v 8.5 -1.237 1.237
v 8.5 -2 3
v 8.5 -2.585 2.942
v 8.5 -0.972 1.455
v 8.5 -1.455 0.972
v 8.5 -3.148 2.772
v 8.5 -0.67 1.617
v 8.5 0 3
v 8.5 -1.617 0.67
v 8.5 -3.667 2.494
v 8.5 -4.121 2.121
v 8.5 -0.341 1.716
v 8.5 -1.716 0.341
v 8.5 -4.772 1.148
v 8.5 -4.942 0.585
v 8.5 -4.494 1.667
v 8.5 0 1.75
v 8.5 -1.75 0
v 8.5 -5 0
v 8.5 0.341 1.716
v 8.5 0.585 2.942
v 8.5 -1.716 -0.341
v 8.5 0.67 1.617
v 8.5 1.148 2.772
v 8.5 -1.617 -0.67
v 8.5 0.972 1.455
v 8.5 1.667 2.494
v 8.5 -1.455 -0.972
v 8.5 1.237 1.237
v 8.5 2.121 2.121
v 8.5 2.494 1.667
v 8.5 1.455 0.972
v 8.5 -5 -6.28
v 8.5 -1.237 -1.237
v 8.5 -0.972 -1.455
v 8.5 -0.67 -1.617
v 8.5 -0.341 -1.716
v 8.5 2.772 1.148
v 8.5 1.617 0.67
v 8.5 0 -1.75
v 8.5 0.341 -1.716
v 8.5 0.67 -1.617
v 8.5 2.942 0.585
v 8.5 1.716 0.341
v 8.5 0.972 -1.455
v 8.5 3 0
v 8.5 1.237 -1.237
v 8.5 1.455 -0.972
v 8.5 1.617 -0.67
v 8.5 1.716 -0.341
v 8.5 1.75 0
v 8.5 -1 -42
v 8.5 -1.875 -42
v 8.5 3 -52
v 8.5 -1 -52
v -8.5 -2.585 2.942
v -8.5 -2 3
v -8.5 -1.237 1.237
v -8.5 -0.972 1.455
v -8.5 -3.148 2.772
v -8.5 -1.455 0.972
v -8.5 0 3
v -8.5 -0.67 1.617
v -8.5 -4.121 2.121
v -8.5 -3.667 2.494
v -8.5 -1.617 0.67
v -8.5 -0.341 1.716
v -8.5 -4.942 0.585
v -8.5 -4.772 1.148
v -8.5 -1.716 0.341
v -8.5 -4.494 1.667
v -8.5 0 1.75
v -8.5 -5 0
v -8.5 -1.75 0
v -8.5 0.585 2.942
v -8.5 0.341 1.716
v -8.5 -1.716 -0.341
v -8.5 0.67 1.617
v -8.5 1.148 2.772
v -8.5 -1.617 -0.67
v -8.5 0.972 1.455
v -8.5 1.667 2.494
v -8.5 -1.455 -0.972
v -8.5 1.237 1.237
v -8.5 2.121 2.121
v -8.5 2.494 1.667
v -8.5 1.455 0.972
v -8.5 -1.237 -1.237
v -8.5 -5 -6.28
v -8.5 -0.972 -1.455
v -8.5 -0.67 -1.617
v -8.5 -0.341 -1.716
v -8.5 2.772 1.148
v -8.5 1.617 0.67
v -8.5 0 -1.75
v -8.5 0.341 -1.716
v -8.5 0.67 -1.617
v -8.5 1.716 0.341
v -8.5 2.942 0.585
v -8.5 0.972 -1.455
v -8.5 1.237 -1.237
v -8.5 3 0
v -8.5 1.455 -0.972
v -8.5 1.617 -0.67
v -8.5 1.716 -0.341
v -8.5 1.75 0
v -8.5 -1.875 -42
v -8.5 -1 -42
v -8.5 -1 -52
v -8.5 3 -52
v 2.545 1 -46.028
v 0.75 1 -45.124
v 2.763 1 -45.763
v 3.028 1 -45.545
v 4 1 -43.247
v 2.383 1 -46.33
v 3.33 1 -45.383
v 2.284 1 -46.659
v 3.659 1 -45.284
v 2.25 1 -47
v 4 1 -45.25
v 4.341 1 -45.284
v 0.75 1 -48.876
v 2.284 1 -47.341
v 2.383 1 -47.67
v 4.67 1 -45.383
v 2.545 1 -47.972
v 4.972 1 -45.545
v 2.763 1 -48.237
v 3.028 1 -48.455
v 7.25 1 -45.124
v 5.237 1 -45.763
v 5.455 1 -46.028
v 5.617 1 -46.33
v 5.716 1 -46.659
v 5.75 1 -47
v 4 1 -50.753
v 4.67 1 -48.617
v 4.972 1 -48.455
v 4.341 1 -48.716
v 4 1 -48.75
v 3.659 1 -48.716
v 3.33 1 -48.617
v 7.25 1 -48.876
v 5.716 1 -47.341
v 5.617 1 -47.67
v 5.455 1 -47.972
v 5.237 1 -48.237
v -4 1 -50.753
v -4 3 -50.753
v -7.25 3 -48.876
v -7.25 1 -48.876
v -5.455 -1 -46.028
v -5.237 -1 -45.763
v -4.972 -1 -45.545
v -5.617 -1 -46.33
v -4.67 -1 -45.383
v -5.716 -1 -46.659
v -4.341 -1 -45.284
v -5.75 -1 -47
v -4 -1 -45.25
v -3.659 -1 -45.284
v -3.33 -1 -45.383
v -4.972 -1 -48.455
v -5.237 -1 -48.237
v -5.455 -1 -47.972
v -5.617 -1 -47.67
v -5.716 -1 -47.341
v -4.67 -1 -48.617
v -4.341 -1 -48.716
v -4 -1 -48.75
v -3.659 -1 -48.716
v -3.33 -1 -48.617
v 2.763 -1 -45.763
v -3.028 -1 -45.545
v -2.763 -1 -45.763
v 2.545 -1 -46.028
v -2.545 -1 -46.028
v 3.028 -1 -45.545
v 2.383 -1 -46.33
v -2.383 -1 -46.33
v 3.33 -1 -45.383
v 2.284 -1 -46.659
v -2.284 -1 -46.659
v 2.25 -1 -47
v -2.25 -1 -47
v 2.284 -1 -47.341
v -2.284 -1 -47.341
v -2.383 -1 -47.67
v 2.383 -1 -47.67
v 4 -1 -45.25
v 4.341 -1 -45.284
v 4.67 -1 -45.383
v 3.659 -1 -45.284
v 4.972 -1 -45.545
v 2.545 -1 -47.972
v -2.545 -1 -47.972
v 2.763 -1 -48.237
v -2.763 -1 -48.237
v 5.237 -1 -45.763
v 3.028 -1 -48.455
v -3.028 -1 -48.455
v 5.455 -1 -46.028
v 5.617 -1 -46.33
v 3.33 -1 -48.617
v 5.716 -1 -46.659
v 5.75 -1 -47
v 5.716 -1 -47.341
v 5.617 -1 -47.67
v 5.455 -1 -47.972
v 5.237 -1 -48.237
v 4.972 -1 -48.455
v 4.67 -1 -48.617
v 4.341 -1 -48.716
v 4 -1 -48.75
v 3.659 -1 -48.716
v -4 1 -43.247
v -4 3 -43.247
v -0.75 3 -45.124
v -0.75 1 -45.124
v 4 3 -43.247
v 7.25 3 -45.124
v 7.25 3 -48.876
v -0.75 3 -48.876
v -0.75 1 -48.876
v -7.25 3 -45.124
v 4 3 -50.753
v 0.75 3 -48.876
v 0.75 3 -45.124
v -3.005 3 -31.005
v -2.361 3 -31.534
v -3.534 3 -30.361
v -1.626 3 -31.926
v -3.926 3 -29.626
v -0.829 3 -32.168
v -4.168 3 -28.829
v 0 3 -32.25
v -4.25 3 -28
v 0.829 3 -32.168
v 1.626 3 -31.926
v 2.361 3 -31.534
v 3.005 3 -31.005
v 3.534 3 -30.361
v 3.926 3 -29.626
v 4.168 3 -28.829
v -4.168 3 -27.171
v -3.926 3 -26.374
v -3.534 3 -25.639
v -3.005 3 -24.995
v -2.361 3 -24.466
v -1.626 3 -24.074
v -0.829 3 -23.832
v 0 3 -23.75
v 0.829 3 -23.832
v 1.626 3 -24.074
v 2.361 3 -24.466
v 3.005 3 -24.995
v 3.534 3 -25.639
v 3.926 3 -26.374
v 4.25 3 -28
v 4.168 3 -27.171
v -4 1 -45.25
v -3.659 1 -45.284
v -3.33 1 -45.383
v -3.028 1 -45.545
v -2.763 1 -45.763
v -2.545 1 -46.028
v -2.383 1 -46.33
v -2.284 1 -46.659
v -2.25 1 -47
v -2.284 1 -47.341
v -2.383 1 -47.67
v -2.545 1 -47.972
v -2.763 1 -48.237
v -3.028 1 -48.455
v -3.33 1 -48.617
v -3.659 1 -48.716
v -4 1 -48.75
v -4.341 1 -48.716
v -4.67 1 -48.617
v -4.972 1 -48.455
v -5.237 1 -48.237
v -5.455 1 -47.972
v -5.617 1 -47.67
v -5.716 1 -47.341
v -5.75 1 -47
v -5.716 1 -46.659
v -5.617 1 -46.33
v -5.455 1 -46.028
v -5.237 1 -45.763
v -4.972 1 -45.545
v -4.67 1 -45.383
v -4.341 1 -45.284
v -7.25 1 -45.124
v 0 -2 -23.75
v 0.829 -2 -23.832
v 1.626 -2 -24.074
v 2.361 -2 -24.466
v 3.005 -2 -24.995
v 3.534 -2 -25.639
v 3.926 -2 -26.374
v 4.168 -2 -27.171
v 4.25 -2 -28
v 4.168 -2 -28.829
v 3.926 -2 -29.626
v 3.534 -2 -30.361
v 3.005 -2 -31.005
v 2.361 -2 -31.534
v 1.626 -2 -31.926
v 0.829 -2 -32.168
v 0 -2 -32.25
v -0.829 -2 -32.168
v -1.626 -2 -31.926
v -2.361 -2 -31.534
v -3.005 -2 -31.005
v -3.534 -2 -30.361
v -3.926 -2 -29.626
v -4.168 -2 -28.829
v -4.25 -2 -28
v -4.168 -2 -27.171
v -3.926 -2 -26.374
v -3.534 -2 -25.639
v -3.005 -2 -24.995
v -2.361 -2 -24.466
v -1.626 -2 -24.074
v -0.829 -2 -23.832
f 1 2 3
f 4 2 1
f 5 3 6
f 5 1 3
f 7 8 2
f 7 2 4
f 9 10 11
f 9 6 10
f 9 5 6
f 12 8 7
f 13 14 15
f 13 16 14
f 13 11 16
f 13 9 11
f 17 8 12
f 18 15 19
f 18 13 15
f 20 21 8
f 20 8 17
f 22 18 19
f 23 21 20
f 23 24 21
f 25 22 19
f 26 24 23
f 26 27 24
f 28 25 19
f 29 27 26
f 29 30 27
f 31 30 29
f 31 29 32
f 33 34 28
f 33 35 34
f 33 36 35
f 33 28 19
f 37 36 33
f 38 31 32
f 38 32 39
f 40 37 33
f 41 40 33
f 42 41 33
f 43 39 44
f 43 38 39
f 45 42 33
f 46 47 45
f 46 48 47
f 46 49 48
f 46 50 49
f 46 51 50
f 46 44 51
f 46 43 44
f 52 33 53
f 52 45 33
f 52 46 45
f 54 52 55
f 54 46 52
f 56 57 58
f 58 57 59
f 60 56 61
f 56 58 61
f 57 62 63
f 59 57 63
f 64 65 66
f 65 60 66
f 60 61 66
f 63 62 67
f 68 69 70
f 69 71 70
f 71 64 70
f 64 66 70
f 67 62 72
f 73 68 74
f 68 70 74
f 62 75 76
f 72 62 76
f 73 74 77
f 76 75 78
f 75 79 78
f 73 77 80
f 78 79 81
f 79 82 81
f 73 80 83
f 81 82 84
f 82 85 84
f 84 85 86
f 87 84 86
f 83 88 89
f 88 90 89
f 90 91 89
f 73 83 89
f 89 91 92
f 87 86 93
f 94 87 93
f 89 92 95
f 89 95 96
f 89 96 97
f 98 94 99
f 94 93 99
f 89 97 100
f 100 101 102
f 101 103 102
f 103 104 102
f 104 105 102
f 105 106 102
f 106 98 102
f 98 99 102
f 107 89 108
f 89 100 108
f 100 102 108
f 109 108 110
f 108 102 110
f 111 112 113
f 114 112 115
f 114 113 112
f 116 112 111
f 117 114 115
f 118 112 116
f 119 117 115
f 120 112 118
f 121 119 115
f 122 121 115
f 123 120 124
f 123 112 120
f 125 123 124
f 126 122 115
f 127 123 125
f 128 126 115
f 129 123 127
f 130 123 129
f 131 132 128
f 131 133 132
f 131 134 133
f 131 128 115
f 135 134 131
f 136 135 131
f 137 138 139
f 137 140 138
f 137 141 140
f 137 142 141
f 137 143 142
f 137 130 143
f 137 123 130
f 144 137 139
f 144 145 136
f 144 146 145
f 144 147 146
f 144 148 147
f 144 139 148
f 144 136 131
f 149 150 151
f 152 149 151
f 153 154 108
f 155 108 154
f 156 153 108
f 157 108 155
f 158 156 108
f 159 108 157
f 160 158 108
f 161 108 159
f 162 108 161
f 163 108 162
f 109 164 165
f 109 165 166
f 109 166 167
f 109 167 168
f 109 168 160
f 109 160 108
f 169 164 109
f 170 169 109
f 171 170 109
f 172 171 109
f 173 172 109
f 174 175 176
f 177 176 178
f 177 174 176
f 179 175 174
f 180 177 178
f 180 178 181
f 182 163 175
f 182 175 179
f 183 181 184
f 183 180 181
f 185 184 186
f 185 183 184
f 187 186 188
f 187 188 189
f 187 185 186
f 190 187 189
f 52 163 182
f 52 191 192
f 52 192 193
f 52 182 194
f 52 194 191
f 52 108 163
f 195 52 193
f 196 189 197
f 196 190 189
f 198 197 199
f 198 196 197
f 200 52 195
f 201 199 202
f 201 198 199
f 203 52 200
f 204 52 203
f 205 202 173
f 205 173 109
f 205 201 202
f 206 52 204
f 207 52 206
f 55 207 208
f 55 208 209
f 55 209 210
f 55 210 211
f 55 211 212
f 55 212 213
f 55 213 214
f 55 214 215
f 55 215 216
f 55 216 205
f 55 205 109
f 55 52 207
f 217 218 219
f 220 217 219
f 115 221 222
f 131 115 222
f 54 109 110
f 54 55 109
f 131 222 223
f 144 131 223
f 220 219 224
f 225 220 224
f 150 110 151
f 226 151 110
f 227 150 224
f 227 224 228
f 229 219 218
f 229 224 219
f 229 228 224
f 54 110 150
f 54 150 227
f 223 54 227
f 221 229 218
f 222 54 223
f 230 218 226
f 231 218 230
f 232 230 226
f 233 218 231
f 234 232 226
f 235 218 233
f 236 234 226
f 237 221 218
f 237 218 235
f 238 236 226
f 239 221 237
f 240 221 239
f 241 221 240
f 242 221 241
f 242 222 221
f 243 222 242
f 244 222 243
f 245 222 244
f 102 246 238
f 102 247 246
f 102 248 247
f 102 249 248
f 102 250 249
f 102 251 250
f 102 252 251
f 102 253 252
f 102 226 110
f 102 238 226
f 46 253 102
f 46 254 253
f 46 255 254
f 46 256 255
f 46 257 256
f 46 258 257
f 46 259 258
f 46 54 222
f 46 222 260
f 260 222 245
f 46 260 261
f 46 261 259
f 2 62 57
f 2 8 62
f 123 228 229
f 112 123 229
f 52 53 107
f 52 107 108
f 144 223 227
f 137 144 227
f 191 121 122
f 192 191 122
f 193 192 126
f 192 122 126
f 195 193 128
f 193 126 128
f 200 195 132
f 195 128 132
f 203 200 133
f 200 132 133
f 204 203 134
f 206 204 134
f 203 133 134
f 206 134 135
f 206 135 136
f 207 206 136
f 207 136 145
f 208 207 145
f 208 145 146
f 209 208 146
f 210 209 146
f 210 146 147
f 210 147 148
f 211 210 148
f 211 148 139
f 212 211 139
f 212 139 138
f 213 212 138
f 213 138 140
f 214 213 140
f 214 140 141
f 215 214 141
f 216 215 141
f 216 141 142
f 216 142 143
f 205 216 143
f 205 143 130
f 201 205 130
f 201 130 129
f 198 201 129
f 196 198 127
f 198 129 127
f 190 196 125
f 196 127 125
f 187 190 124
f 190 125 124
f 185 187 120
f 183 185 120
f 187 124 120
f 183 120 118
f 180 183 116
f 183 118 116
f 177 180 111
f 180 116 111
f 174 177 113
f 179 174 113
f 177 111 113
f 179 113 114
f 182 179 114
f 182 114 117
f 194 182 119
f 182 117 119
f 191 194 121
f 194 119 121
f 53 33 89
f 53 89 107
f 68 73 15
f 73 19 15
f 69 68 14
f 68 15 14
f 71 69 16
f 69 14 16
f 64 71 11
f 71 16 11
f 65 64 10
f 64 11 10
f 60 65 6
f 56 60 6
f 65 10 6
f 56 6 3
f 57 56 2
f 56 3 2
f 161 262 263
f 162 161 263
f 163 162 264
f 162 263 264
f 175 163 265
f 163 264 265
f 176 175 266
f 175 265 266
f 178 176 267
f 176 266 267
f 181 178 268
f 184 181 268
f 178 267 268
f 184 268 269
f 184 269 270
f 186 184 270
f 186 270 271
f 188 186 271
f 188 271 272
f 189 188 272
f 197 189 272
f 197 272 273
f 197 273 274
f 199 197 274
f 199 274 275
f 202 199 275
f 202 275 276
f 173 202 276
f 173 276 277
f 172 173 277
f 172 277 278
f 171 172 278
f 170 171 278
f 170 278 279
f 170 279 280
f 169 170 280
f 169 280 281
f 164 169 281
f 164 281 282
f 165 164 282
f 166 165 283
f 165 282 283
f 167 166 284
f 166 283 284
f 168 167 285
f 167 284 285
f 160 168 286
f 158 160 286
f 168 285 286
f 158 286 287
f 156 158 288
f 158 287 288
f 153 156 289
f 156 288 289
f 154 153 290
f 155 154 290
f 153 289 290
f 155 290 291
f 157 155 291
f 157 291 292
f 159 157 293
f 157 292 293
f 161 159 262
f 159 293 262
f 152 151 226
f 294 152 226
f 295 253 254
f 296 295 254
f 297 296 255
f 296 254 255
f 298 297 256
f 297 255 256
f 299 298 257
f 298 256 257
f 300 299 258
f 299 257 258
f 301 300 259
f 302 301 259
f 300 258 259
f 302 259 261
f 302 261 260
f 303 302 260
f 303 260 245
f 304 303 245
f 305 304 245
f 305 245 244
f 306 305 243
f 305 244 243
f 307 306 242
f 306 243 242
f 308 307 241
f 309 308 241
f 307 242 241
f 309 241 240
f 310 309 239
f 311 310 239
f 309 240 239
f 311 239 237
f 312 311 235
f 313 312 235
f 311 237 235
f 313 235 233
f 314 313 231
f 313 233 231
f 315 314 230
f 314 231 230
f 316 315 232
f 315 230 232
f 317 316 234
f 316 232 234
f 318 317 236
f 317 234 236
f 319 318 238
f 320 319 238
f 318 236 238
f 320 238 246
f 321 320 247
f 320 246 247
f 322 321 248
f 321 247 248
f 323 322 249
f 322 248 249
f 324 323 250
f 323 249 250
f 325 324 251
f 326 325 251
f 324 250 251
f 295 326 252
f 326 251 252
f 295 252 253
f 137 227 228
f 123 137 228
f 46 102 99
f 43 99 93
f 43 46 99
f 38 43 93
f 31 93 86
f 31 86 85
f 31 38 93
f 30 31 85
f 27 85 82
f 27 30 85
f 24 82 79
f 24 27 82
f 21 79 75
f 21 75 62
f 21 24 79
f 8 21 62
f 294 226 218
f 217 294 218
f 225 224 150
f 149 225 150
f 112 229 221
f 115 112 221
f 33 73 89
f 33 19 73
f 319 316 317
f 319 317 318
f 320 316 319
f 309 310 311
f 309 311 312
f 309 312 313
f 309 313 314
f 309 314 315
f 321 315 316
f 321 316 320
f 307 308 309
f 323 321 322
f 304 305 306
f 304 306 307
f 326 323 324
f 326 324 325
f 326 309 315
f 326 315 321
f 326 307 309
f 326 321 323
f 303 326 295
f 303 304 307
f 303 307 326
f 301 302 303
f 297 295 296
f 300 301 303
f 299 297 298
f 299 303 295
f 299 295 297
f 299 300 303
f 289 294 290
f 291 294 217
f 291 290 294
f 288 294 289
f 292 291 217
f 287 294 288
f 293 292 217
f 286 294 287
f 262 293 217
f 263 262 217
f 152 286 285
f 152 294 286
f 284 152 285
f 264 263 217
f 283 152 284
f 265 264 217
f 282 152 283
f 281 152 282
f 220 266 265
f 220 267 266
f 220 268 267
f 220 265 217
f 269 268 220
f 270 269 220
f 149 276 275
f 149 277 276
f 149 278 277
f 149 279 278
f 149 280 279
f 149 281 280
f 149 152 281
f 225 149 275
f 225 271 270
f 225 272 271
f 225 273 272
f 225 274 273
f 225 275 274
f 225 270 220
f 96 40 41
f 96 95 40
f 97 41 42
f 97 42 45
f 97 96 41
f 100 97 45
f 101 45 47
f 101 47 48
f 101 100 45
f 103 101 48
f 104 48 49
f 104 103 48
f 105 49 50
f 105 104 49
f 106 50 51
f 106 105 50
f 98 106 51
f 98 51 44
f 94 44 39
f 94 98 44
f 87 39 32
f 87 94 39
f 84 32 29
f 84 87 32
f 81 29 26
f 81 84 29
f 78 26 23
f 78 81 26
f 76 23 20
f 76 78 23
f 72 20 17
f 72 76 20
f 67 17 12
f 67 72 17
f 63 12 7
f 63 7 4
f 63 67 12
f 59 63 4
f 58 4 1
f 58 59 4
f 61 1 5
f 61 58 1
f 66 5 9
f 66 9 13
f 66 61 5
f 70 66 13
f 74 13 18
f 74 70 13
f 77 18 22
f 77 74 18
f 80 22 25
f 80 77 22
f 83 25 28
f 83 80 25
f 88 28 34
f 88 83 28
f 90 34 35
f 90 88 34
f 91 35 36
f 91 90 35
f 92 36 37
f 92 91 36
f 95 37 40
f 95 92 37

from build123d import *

# Parameters (mm, degrees)
SKETCH1_R           = 1.75
BOSS_EXTRUDE1_DEPTH = 8.5
FILLET1_R           = 3
SKETCH2_R           = 1.75
CUT_EXTRUDE1_DEPTH  = 54.293995909
SKETCH2_3_R         = 1.75
CUT_EXTRUDE2_DEPTH  = 2
SKETCH3_R           = 4.25
CUT_EXTRUDE3_DEPTH  = 5


with BuildPart() as part:
    # Sketch1 → Boss-Extrude1 (new, symmetric)
    with BuildSketch(Plane(origin=(0, 0, 0), x_dir=(0, 0, -1), z_dir=(1, 0, 0))):
        with BuildLine():
            ThreePointArc((0, 3), (-2.121320344, 2.121320344), (-3, 0))
            Line((-3, 0), (-3, -5))
            Line((-3, -5), (6.279790789, -5))
            Line((6.279790789, -5), (42, -1.874886635))
            Line((42, -1.874886635), (42, -1))
            Line((42, -1), (52, -1))
            Line((52, -1), (52, 3))
            Line((52, 3), (0, 3))
        make_face()
        Circle(SKETCH1_R, mode=Mode.SUBTRACT)
    extrude(amount=BOSS_EXTRUDE1_DEPTH, both=True)

    # Fillet1
    fillet1_edges = [part.edges().sort_by_distance(p)[0] for p in [
        (0, -5, 3),
    ]]
    fillet(fillet1_edges, radius=FILLET1_R)

    # Sketch2 → Cut-Extrude1 (cut, through all)
    with BuildSketch(Plane(origin=(0, 3, 0), x_dir=(1, 0, 0), z_dir=(0, 1, 0))):
        with Locations((-4, 47)):
            Circle(SKETCH2_R)
        with Locations((4, 47)):
            Circle(SKETCH2_R)
    extrude(amount=-CUT_EXTRUDE1_DEPTH, mode=Mode.SUBTRACT)

    # Sketch2<3> → Cut-Extrude2 (cut)
    # profile 1 of 2: a face of its own
    with BuildSketch(Plane(origin=(0, 3, 0), x_dir=(1, 0, 0), z_dir=(0, 1, 0))):
        Polygon((0.75, 48.876388375), (0.75, 45.123611625), (4, 43.24722325), (7.25, 45.123611625), (7.25, 48.876388375), (4, 50.75277675), align=None)
        with Locations((4, 47)):
            Circle(SKETCH2_3_R, mode=Mode.SUBTRACT)
    # profile 2 of 2: a face of its own
    with BuildSketch(Plane(origin=(0, 3, 0), x_dir=(1, 0, 0), z_dir=(0, 1, 0))):
        Polygon((-0.75, 45.123611625), (-0.75, 48.876388375), (-4, 50.75277675), (-7.25, 48.876388375), (-7.25, 45.123611625), (-4, 43.24722325), align=None)
        with Locations((-4, 47)):
            Circle(SKETCH2_3_R, mode=Mode.SUBTRACT)
    extrude(amount=-CUT_EXTRUDE2_DEPTH, mode=Mode.SUBTRACT)

    # Sketch3 → Cut-Extrude3 (cut)
    with BuildSketch(Plane(origin=(0, 3, 0), x_dir=(1, 0, 0), z_dir=(0, 1, 0))):
        with Locations((0, 28)):
            Circle(SKETCH3_R)
    extrude(amount=-CUT_EXTRUDE3_DEPTH, mode=Mode.SUBTRACT)


solid = part.part
